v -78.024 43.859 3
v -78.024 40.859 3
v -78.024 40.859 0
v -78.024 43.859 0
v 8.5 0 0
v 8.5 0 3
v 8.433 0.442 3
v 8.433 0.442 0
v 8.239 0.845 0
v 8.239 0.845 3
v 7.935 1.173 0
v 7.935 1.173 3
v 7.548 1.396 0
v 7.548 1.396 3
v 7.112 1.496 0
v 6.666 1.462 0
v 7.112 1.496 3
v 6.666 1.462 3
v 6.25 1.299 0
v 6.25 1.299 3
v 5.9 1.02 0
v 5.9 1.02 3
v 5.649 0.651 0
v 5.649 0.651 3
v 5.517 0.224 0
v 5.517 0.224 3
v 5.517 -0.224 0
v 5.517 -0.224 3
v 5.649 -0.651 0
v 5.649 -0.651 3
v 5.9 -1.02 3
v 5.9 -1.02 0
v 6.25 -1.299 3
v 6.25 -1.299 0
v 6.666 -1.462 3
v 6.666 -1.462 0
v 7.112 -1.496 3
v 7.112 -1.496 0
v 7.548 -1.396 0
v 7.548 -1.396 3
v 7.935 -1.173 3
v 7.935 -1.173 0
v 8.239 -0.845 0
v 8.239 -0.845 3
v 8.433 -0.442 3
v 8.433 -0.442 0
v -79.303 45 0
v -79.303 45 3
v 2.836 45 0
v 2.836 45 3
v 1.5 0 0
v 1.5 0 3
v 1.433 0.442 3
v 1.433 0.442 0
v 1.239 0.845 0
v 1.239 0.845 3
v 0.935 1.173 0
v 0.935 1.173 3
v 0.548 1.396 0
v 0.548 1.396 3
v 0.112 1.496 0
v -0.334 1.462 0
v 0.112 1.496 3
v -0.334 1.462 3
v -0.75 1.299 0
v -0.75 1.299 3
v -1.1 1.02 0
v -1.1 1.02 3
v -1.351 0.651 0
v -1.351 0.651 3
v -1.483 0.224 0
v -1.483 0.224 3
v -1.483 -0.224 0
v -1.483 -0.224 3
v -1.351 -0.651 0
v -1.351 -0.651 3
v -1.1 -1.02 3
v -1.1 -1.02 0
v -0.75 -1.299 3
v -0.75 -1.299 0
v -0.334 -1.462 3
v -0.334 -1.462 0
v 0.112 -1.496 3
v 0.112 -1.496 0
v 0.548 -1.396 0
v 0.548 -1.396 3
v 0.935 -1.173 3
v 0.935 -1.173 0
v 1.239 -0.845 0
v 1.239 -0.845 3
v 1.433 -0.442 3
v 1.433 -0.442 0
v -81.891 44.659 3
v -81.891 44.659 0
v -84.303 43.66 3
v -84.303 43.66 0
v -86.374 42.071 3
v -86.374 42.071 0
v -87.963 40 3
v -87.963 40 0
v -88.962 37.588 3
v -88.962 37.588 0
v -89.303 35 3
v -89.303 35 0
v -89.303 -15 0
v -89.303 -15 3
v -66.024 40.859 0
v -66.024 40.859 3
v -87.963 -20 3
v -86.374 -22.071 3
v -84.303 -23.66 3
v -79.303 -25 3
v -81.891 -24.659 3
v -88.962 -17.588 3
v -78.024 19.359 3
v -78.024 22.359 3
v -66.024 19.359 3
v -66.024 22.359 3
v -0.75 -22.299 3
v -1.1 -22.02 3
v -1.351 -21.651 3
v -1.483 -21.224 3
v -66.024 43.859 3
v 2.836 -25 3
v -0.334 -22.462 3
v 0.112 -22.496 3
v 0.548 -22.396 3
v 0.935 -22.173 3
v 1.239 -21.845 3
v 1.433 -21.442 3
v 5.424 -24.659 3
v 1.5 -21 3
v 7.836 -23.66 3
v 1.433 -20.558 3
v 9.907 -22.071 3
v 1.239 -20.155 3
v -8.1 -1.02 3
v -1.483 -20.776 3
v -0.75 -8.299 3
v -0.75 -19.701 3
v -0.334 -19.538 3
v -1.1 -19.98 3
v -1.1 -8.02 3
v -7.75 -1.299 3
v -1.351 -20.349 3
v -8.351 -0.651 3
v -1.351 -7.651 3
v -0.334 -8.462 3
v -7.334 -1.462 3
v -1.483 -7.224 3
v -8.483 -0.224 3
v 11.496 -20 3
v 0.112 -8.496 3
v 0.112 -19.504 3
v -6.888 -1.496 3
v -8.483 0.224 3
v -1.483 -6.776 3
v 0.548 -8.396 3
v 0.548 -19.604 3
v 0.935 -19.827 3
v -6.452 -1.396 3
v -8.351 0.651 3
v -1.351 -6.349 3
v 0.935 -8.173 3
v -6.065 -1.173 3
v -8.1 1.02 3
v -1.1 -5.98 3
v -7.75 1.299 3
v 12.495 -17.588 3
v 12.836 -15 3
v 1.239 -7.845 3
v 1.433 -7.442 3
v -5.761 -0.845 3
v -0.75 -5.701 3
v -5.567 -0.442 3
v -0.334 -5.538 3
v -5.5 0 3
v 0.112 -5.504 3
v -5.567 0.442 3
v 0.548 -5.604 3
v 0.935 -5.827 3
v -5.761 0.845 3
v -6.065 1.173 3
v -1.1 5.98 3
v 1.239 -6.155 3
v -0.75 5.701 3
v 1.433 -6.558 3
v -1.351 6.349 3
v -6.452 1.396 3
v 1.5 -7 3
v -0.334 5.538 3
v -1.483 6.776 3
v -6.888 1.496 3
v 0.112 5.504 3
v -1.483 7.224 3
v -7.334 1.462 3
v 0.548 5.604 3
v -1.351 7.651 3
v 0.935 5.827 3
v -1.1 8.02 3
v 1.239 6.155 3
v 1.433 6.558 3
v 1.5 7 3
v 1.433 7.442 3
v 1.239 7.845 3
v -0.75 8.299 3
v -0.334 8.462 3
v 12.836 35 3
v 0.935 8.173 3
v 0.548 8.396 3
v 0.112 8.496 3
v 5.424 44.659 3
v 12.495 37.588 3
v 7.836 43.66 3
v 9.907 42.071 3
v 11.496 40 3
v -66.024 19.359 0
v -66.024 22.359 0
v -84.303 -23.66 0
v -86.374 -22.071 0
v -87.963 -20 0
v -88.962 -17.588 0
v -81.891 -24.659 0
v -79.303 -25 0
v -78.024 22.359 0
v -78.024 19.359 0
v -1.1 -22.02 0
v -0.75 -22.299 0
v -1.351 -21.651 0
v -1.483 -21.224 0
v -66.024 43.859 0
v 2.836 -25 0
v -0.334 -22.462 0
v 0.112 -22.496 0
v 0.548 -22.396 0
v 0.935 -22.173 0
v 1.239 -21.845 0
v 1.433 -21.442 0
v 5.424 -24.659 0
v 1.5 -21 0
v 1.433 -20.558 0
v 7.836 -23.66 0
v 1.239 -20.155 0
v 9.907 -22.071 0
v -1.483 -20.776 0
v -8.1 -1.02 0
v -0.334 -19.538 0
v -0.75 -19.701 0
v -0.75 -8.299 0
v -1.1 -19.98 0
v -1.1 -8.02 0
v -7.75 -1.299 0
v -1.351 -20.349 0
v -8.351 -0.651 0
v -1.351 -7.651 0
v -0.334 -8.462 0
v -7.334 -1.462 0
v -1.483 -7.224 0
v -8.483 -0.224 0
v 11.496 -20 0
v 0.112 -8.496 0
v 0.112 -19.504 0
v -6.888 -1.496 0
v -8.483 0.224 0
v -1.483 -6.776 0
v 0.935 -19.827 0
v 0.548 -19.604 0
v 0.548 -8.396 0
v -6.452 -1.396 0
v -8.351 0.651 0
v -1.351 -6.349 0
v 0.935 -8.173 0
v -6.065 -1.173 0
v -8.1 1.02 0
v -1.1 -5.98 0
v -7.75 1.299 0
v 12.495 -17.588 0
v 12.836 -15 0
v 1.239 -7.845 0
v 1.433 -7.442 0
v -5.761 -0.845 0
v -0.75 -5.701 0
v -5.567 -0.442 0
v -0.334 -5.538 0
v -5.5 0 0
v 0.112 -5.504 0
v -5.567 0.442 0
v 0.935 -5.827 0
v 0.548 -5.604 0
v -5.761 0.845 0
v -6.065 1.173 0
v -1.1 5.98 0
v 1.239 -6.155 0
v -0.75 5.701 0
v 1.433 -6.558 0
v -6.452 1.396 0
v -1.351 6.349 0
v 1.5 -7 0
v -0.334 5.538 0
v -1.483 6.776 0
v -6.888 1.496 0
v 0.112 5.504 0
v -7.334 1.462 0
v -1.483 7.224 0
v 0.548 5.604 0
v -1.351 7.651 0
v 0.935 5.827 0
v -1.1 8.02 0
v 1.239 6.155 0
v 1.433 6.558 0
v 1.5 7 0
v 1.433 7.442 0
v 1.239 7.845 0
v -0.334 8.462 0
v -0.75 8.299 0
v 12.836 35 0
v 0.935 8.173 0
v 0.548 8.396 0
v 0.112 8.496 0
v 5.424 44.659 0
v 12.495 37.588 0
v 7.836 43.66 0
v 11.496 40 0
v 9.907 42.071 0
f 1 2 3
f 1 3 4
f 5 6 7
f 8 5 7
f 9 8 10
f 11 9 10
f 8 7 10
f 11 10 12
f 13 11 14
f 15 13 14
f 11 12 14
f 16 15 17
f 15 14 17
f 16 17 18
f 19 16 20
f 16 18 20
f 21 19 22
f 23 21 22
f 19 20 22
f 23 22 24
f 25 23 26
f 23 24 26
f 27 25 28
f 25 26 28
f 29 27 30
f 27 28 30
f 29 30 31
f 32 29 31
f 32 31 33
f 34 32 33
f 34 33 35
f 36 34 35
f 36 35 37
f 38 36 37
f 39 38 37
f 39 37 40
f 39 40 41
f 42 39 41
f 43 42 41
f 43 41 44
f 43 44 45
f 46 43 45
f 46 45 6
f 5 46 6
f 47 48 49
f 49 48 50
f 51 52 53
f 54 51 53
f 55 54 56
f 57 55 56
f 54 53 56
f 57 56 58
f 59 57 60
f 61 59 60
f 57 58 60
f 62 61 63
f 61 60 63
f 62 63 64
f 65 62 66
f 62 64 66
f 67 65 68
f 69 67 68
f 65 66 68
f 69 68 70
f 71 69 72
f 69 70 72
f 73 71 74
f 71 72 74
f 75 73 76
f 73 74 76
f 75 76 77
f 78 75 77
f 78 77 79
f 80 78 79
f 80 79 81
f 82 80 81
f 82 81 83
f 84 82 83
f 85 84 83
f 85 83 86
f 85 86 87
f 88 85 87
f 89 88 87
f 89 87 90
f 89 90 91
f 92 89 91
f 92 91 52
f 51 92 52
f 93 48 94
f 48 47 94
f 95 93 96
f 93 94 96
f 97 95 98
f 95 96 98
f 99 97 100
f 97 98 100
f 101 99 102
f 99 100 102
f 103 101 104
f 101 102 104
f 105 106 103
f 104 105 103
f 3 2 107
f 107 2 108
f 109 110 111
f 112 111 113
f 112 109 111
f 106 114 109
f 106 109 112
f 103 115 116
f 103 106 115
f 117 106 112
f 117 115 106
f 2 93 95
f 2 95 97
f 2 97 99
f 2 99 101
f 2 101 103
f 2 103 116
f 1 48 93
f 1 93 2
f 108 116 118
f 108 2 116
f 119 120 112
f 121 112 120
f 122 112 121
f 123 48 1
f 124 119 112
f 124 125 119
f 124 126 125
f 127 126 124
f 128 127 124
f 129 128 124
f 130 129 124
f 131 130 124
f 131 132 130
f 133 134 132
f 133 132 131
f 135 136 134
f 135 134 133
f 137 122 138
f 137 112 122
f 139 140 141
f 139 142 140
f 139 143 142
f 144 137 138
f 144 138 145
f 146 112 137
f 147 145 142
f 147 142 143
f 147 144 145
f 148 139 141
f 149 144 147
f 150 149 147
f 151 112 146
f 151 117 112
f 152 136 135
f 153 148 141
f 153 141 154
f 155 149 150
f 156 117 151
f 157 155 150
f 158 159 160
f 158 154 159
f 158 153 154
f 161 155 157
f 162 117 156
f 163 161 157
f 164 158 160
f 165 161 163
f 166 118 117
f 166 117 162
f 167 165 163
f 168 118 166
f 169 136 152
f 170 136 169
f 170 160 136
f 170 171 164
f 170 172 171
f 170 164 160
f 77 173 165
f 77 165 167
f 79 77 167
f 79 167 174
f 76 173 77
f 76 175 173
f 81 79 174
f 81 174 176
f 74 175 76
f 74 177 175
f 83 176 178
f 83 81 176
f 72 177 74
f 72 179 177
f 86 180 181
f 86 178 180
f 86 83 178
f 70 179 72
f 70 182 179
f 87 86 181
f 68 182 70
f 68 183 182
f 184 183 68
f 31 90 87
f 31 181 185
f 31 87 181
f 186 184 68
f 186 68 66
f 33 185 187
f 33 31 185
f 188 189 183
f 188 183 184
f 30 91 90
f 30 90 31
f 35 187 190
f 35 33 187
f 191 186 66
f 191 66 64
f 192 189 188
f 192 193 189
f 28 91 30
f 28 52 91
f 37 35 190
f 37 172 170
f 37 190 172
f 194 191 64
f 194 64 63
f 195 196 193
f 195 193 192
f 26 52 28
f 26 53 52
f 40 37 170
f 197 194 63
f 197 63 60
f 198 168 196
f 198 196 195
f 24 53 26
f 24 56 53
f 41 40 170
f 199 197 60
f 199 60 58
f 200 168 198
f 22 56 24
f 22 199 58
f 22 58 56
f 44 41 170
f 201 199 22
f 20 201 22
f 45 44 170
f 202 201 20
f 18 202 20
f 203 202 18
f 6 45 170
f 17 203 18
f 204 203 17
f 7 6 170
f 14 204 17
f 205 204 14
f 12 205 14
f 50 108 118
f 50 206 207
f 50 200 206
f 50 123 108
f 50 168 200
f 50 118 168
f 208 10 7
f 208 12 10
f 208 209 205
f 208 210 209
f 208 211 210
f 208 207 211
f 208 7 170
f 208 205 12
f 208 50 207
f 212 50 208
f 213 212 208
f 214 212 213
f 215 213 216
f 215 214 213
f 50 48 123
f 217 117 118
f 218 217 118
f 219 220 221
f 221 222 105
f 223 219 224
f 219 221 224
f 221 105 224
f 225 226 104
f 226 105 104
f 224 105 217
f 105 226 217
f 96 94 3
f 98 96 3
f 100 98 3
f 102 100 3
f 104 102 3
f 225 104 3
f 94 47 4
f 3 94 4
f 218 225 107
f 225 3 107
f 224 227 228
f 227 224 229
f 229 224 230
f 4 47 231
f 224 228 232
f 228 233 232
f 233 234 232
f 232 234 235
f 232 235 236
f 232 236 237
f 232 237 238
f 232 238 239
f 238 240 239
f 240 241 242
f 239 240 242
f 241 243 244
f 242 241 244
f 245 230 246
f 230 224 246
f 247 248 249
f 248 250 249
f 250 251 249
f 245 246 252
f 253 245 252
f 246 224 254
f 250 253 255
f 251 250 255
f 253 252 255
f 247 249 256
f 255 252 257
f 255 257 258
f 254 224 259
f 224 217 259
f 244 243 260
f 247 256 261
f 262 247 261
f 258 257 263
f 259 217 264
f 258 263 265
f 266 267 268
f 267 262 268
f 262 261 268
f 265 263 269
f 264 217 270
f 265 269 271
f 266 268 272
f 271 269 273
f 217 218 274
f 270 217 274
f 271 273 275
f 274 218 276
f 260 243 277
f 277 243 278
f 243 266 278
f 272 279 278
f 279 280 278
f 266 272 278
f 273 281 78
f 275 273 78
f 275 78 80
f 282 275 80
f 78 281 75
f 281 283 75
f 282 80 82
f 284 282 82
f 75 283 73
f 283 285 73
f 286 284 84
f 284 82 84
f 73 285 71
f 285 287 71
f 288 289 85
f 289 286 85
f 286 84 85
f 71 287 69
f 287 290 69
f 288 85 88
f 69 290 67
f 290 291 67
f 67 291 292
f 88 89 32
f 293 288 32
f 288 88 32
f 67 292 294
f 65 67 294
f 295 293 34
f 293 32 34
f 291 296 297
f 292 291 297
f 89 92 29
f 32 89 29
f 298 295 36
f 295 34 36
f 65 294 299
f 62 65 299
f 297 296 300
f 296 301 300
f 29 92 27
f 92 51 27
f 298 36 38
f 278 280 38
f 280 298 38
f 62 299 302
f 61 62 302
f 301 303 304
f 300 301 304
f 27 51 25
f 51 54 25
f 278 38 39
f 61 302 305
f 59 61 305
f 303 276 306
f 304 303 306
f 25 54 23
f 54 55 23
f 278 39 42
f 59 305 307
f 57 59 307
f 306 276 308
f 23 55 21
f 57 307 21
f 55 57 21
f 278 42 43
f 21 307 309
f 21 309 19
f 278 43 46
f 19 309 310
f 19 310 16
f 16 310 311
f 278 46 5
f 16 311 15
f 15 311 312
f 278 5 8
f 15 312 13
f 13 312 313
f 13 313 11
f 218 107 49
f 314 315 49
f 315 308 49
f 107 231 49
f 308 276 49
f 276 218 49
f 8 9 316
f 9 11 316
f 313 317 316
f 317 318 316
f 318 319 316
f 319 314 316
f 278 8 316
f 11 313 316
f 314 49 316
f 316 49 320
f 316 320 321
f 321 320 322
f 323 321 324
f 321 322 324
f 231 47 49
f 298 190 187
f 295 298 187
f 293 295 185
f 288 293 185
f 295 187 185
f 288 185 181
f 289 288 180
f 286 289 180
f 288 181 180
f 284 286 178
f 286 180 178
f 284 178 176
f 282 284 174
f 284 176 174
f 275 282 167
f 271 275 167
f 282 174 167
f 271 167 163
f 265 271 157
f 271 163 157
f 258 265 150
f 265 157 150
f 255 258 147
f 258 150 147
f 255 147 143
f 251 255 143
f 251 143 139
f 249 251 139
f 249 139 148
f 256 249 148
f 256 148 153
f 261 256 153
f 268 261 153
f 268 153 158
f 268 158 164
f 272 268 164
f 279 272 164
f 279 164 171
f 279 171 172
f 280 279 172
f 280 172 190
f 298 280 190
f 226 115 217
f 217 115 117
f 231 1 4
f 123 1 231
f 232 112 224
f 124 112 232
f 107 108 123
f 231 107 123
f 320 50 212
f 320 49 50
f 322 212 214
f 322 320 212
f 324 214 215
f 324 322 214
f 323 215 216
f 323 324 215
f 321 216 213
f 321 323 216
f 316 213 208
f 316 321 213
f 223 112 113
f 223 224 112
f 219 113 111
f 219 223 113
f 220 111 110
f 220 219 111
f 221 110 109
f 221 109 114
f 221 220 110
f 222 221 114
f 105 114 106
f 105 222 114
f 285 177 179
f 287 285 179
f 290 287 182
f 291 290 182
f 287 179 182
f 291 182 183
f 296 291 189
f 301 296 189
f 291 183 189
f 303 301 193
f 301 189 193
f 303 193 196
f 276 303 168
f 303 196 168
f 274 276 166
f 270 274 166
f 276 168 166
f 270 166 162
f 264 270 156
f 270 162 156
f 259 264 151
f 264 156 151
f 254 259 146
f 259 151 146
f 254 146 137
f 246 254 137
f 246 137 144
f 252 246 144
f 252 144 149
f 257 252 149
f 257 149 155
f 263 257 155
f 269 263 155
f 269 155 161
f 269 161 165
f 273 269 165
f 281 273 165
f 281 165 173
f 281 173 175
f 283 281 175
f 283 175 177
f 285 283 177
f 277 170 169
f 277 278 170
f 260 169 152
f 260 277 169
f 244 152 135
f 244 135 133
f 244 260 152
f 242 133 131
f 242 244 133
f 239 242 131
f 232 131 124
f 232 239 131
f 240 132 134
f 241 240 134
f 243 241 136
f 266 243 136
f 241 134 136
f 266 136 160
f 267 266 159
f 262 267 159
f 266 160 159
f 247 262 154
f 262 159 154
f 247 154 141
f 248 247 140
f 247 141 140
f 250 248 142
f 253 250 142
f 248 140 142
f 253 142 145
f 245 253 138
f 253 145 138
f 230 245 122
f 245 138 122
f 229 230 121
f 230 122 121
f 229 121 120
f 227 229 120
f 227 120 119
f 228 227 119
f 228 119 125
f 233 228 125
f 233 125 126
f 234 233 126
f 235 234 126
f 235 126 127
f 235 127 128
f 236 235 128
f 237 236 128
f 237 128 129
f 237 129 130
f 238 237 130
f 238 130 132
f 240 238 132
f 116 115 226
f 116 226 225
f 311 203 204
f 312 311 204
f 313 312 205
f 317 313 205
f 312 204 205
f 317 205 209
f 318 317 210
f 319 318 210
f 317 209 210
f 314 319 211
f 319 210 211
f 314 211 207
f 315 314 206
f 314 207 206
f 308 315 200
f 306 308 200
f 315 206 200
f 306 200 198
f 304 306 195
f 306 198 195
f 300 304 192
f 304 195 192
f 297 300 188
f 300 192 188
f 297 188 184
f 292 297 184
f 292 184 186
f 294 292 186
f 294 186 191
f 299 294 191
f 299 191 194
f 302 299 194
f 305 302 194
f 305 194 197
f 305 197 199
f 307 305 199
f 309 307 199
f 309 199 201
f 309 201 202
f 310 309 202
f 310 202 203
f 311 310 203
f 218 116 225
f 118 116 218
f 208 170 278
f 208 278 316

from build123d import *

# Parameters (mm, degrees)
BOSS_EXTRUDE1_DEPTH = 3
SKETCH3_OUTSIDE_W   = 181.071
SKETCH3_OUTSIDE_H   = 249.846
SKETCH3_OUTSIDE_W_2 = 131.224989992
SKETCH3_OUTSIDE_H_2 = 70
CUT_EXTRUDE2_DEPTH  = 10
CUT_EXTRUDE3_REACH  = 111.7
SKETCH4_R           = 1.5
CUT_EXTRUDE4_REACH  = 111.7
SKETCH5_W           = 48.153954936
SKETCH5_H           = 90
CUT_EXTRUDE5_REACH  = 111.7
SKETCH6_W           = 16.692706212
SKETCH6_H           = 90.485388772
FILLET1_R           = 10
CUT_EXTRUDE6_REACH  = 102.045
SKETCH8_W           = 12
SKETCH8_H           = 3


with BuildPart() as part:
    # Sketch1 → Boss-Extrude1 (new body)
    with BuildSketch(Plane.XY):
        with BuildLine():
            Line((31.224989992, -95), (31.224989992, 95))
            ThreePointArc((31.224989992, 95), (-100, 0), (31.224989992, -95))
        make_face()
    extrude(amount=BOSS_EXTRUDE1_DEPTH)

    # Sketch3 outside → Cut-Extrude2 (cut)
    with BuildSketch(Plane.XY.offset(3)):
        with Locations((-34.3875, 0)):
            Rectangle(SKETCH3_OUTSIDE_W, SKETCH3_OUTSIDE_H)
        with Locations((-34.387505004, 10)):
            Rectangle(SKETCH3_OUTSIDE_W_2, SKETCH3_OUTSIDE_H_2, mode=Mode.SUBTRACT)
    extrude(amount=-CUT_EXTRUDE2_DEPTH, mode=Mode.SUBTRACT)

    # Sketch4 → Cut-Extrude3 (cut, up to next)
    with BuildSketch(Plane.XY.offset(3), mode=Mode.PRIVATE) as cut_extrude3_sk1:
        with Locations((0, 7)):
            Circle(SKETCH4_R)
    cut_extrude3_tool1 = extrude(cut_extrude3_sk1.sketch, amount=-CUT_EXTRUDE3_REACH, mode=Mode.PRIVATE) & part.part
    # Sketch4 → Cut-Extrude3 (cut, up to next)
    with BuildSketch(Plane.XY.offset(3), mode=Mode.PRIVATE) as cut_extrude3_sk2:
        with Locations((0, -7)):
            Circle(SKETCH4_R)
    cut_extrude3_tool2 = extrude(cut_extrude3_sk2.sketch, amount=-CUT_EXTRUDE3_REACH, mode=Mode.PRIVATE) & part.part
    # Sketch4 → Cut-Extrude3 (cut, up to next)
    with BuildSketch(Plane.XY.offset(3), mode=Mode.PRIVATE) as cut_extrude3_sk3:
        with Locations((7, 0)):
            Circle(SKETCH4_R)
    cut_extrude3_tool3 = extrude(cut_extrude3_sk3.sketch, amount=-CUT_EXTRUDE3_REACH, mode=Mode.PRIVATE) & part.part
    # Sketch4 → Cut-Extrude3 (cut, up to next)
    with BuildSketch(Plane.XY.offset(3), mode=Mode.PRIVATE) as cut_extrude3_sk4:
        with Locations((-7, 0)):
            Circle(SKETCH4_R)
    cut_extrude3_tool4 = extrude(cut_extrude3_sk4.sketch, amount=-CUT_EXTRUDE3_REACH, mode=Mode.PRIVATE) & part.part
    # Sketch4 → Cut-Extrude3 (cut, up to next)
    with BuildSketch(Plane.XY.offset(3), mode=Mode.PRIVATE) as cut_extrude3_sk5:
        Circle(SKETCH4_R)
    cut_extrude3_tool5 = extrude(cut_extrude3_sk5.sketch, amount=-CUT_EXTRUDE3_REACH, mode=Mode.PRIVATE) & part.part
    # Sketch4 → Cut-Extrude3 (cut, up to next)
    with BuildSketch(Plane.XY.offset(3), mode=Mode.PRIVATE) as cut_extrude3_sk6:
        with Locations((0, -21)):
            Circle(SKETCH4_R)
    cut_extrude3_tool6 = extrude(cut_extrude3_sk6.sketch, amount=-CUT_EXTRUDE3_REACH, mode=Mode.PRIVATE) & part.part
    add(cut_extrude3_tool1.solids().sort_by_distance((0, 7, 3))[0], mode=Mode.SUBTRACT)
    add(cut_extrude3_tool2.solids().sort_by_distance((0, -7, 3))[0], mode=Mode.SUBTRACT)
    add(cut_extrude3_tool3.solids().sort_by_distance((7, 0, 3))[0], mode=Mode.SUBTRACT)
    add(cut_extrude3_tool4.solids().sort_by_distance((-7, 0, 3))[0], mode=Mode.SUBTRACT)
    add(cut_extrude3_tool5.solids().sort_by_distance((0, 0, 3))[0], mode=Mode.SUBTRACT)
    add(cut_extrude3_tool6.solids().sort_by_distance((0, -21, 3))[0], mode=Mode.SUBTRACT)

    # Sketch5 → Cut-Extrude4 (cut, up to next)
    with BuildSketch(Plane.XY.offset(3), mode=Mode.PRIVATE) as cut_extrude4_sk1:
        with Locations((36.913108842, 0)):
            Rectangle(SKETCH5_W, SKETCH5_H)
    cut_extrude4_tool1 = extrude(cut_extrude4_sk1.sketch, amount=-CUT_EXTRUDE4_REACH, mode=Mode.PRIVATE) & part.part
    add(cut_extrude4_tool1.solids().sort_by_distance((36.913109, 0, 3))[0], mode=Mode.SUBTRACT)

    # Sketch6 → Cut-Extrude5 (cut, up to next)
    with BuildSketch(Plane.XY.offset(3), mode=Mode.PRIVATE) as cut_extrude5_sk1:
        with Locations((-97.649208603, -0.242694386)):
            Rectangle(SKETCH6_W, SKETCH6_H)
    cut_extrude5_tool1 = extrude(cut_extrude5_sk1.sketch, amount=-CUT_EXTRUDE5_REACH, mode=Mode.PRIVATE) & part.part
    add(cut_extrude5_tool1.solids().sort_by_distance((-97.649209, -0.242694, 3))[0], mode=Mode.SUBTRACT)

    # Fillet1
    fillet1_edges = [part.edges().sort_by_distance(p)[0] for p in [
        (-89.302855497, 45, 1.5),
        (12.836131374, -25, 1.5),
        (12.836131374, 45, 1.5),
        (-89.302855497, -25, 1.5),
    ]]
    fillet(fillet1_edges, radius=FILLET1_R)

    # Sketch8 → Cut-Extrude6 (cut, up to next)
    with BuildSketch(Plane.XY.offset(3), mode=Mode.PRIVATE) as cut_extrude6_sk1:
        with Locations((-72.023868626, 42.359338222)):
            Rectangle(SKETCH8_W, SKETCH8_H)
    cut_extrude6_tool1 = extrude(cut_extrude6_sk1.sketch, amount=-CUT_EXTRUDE6_REACH, mode=Mode.PRIVATE) & part.part
    # Sketch8 → Cut-Extrude6 (cut, up to next)
    with BuildSketch(Plane.XY.offset(3), mode=Mode.PRIVATE) as cut_extrude6_sk2:
        with Locations((-72.023868626, 20.859338222)):
            Rectangle(SKETCH8_W, SKETCH8_H)
    cut_extrude6_tool2 = extrude(cut_extrude6_sk2.sketch, amount=-CUT_EXTRUDE6_REACH, mode=Mode.PRIVATE) & part.part
    add(cut_extrude6_tool1.solids().sort_by_distance((-72.023869, 42.359338, 3))[0], mode=Mode.SUBTRACT)
    add(cut_extrude6_tool2.solids().sort_by_distance((-72.023869, 20.859338, 3))[0], mode=Mode.SUBTRACT)


solid = part.part
